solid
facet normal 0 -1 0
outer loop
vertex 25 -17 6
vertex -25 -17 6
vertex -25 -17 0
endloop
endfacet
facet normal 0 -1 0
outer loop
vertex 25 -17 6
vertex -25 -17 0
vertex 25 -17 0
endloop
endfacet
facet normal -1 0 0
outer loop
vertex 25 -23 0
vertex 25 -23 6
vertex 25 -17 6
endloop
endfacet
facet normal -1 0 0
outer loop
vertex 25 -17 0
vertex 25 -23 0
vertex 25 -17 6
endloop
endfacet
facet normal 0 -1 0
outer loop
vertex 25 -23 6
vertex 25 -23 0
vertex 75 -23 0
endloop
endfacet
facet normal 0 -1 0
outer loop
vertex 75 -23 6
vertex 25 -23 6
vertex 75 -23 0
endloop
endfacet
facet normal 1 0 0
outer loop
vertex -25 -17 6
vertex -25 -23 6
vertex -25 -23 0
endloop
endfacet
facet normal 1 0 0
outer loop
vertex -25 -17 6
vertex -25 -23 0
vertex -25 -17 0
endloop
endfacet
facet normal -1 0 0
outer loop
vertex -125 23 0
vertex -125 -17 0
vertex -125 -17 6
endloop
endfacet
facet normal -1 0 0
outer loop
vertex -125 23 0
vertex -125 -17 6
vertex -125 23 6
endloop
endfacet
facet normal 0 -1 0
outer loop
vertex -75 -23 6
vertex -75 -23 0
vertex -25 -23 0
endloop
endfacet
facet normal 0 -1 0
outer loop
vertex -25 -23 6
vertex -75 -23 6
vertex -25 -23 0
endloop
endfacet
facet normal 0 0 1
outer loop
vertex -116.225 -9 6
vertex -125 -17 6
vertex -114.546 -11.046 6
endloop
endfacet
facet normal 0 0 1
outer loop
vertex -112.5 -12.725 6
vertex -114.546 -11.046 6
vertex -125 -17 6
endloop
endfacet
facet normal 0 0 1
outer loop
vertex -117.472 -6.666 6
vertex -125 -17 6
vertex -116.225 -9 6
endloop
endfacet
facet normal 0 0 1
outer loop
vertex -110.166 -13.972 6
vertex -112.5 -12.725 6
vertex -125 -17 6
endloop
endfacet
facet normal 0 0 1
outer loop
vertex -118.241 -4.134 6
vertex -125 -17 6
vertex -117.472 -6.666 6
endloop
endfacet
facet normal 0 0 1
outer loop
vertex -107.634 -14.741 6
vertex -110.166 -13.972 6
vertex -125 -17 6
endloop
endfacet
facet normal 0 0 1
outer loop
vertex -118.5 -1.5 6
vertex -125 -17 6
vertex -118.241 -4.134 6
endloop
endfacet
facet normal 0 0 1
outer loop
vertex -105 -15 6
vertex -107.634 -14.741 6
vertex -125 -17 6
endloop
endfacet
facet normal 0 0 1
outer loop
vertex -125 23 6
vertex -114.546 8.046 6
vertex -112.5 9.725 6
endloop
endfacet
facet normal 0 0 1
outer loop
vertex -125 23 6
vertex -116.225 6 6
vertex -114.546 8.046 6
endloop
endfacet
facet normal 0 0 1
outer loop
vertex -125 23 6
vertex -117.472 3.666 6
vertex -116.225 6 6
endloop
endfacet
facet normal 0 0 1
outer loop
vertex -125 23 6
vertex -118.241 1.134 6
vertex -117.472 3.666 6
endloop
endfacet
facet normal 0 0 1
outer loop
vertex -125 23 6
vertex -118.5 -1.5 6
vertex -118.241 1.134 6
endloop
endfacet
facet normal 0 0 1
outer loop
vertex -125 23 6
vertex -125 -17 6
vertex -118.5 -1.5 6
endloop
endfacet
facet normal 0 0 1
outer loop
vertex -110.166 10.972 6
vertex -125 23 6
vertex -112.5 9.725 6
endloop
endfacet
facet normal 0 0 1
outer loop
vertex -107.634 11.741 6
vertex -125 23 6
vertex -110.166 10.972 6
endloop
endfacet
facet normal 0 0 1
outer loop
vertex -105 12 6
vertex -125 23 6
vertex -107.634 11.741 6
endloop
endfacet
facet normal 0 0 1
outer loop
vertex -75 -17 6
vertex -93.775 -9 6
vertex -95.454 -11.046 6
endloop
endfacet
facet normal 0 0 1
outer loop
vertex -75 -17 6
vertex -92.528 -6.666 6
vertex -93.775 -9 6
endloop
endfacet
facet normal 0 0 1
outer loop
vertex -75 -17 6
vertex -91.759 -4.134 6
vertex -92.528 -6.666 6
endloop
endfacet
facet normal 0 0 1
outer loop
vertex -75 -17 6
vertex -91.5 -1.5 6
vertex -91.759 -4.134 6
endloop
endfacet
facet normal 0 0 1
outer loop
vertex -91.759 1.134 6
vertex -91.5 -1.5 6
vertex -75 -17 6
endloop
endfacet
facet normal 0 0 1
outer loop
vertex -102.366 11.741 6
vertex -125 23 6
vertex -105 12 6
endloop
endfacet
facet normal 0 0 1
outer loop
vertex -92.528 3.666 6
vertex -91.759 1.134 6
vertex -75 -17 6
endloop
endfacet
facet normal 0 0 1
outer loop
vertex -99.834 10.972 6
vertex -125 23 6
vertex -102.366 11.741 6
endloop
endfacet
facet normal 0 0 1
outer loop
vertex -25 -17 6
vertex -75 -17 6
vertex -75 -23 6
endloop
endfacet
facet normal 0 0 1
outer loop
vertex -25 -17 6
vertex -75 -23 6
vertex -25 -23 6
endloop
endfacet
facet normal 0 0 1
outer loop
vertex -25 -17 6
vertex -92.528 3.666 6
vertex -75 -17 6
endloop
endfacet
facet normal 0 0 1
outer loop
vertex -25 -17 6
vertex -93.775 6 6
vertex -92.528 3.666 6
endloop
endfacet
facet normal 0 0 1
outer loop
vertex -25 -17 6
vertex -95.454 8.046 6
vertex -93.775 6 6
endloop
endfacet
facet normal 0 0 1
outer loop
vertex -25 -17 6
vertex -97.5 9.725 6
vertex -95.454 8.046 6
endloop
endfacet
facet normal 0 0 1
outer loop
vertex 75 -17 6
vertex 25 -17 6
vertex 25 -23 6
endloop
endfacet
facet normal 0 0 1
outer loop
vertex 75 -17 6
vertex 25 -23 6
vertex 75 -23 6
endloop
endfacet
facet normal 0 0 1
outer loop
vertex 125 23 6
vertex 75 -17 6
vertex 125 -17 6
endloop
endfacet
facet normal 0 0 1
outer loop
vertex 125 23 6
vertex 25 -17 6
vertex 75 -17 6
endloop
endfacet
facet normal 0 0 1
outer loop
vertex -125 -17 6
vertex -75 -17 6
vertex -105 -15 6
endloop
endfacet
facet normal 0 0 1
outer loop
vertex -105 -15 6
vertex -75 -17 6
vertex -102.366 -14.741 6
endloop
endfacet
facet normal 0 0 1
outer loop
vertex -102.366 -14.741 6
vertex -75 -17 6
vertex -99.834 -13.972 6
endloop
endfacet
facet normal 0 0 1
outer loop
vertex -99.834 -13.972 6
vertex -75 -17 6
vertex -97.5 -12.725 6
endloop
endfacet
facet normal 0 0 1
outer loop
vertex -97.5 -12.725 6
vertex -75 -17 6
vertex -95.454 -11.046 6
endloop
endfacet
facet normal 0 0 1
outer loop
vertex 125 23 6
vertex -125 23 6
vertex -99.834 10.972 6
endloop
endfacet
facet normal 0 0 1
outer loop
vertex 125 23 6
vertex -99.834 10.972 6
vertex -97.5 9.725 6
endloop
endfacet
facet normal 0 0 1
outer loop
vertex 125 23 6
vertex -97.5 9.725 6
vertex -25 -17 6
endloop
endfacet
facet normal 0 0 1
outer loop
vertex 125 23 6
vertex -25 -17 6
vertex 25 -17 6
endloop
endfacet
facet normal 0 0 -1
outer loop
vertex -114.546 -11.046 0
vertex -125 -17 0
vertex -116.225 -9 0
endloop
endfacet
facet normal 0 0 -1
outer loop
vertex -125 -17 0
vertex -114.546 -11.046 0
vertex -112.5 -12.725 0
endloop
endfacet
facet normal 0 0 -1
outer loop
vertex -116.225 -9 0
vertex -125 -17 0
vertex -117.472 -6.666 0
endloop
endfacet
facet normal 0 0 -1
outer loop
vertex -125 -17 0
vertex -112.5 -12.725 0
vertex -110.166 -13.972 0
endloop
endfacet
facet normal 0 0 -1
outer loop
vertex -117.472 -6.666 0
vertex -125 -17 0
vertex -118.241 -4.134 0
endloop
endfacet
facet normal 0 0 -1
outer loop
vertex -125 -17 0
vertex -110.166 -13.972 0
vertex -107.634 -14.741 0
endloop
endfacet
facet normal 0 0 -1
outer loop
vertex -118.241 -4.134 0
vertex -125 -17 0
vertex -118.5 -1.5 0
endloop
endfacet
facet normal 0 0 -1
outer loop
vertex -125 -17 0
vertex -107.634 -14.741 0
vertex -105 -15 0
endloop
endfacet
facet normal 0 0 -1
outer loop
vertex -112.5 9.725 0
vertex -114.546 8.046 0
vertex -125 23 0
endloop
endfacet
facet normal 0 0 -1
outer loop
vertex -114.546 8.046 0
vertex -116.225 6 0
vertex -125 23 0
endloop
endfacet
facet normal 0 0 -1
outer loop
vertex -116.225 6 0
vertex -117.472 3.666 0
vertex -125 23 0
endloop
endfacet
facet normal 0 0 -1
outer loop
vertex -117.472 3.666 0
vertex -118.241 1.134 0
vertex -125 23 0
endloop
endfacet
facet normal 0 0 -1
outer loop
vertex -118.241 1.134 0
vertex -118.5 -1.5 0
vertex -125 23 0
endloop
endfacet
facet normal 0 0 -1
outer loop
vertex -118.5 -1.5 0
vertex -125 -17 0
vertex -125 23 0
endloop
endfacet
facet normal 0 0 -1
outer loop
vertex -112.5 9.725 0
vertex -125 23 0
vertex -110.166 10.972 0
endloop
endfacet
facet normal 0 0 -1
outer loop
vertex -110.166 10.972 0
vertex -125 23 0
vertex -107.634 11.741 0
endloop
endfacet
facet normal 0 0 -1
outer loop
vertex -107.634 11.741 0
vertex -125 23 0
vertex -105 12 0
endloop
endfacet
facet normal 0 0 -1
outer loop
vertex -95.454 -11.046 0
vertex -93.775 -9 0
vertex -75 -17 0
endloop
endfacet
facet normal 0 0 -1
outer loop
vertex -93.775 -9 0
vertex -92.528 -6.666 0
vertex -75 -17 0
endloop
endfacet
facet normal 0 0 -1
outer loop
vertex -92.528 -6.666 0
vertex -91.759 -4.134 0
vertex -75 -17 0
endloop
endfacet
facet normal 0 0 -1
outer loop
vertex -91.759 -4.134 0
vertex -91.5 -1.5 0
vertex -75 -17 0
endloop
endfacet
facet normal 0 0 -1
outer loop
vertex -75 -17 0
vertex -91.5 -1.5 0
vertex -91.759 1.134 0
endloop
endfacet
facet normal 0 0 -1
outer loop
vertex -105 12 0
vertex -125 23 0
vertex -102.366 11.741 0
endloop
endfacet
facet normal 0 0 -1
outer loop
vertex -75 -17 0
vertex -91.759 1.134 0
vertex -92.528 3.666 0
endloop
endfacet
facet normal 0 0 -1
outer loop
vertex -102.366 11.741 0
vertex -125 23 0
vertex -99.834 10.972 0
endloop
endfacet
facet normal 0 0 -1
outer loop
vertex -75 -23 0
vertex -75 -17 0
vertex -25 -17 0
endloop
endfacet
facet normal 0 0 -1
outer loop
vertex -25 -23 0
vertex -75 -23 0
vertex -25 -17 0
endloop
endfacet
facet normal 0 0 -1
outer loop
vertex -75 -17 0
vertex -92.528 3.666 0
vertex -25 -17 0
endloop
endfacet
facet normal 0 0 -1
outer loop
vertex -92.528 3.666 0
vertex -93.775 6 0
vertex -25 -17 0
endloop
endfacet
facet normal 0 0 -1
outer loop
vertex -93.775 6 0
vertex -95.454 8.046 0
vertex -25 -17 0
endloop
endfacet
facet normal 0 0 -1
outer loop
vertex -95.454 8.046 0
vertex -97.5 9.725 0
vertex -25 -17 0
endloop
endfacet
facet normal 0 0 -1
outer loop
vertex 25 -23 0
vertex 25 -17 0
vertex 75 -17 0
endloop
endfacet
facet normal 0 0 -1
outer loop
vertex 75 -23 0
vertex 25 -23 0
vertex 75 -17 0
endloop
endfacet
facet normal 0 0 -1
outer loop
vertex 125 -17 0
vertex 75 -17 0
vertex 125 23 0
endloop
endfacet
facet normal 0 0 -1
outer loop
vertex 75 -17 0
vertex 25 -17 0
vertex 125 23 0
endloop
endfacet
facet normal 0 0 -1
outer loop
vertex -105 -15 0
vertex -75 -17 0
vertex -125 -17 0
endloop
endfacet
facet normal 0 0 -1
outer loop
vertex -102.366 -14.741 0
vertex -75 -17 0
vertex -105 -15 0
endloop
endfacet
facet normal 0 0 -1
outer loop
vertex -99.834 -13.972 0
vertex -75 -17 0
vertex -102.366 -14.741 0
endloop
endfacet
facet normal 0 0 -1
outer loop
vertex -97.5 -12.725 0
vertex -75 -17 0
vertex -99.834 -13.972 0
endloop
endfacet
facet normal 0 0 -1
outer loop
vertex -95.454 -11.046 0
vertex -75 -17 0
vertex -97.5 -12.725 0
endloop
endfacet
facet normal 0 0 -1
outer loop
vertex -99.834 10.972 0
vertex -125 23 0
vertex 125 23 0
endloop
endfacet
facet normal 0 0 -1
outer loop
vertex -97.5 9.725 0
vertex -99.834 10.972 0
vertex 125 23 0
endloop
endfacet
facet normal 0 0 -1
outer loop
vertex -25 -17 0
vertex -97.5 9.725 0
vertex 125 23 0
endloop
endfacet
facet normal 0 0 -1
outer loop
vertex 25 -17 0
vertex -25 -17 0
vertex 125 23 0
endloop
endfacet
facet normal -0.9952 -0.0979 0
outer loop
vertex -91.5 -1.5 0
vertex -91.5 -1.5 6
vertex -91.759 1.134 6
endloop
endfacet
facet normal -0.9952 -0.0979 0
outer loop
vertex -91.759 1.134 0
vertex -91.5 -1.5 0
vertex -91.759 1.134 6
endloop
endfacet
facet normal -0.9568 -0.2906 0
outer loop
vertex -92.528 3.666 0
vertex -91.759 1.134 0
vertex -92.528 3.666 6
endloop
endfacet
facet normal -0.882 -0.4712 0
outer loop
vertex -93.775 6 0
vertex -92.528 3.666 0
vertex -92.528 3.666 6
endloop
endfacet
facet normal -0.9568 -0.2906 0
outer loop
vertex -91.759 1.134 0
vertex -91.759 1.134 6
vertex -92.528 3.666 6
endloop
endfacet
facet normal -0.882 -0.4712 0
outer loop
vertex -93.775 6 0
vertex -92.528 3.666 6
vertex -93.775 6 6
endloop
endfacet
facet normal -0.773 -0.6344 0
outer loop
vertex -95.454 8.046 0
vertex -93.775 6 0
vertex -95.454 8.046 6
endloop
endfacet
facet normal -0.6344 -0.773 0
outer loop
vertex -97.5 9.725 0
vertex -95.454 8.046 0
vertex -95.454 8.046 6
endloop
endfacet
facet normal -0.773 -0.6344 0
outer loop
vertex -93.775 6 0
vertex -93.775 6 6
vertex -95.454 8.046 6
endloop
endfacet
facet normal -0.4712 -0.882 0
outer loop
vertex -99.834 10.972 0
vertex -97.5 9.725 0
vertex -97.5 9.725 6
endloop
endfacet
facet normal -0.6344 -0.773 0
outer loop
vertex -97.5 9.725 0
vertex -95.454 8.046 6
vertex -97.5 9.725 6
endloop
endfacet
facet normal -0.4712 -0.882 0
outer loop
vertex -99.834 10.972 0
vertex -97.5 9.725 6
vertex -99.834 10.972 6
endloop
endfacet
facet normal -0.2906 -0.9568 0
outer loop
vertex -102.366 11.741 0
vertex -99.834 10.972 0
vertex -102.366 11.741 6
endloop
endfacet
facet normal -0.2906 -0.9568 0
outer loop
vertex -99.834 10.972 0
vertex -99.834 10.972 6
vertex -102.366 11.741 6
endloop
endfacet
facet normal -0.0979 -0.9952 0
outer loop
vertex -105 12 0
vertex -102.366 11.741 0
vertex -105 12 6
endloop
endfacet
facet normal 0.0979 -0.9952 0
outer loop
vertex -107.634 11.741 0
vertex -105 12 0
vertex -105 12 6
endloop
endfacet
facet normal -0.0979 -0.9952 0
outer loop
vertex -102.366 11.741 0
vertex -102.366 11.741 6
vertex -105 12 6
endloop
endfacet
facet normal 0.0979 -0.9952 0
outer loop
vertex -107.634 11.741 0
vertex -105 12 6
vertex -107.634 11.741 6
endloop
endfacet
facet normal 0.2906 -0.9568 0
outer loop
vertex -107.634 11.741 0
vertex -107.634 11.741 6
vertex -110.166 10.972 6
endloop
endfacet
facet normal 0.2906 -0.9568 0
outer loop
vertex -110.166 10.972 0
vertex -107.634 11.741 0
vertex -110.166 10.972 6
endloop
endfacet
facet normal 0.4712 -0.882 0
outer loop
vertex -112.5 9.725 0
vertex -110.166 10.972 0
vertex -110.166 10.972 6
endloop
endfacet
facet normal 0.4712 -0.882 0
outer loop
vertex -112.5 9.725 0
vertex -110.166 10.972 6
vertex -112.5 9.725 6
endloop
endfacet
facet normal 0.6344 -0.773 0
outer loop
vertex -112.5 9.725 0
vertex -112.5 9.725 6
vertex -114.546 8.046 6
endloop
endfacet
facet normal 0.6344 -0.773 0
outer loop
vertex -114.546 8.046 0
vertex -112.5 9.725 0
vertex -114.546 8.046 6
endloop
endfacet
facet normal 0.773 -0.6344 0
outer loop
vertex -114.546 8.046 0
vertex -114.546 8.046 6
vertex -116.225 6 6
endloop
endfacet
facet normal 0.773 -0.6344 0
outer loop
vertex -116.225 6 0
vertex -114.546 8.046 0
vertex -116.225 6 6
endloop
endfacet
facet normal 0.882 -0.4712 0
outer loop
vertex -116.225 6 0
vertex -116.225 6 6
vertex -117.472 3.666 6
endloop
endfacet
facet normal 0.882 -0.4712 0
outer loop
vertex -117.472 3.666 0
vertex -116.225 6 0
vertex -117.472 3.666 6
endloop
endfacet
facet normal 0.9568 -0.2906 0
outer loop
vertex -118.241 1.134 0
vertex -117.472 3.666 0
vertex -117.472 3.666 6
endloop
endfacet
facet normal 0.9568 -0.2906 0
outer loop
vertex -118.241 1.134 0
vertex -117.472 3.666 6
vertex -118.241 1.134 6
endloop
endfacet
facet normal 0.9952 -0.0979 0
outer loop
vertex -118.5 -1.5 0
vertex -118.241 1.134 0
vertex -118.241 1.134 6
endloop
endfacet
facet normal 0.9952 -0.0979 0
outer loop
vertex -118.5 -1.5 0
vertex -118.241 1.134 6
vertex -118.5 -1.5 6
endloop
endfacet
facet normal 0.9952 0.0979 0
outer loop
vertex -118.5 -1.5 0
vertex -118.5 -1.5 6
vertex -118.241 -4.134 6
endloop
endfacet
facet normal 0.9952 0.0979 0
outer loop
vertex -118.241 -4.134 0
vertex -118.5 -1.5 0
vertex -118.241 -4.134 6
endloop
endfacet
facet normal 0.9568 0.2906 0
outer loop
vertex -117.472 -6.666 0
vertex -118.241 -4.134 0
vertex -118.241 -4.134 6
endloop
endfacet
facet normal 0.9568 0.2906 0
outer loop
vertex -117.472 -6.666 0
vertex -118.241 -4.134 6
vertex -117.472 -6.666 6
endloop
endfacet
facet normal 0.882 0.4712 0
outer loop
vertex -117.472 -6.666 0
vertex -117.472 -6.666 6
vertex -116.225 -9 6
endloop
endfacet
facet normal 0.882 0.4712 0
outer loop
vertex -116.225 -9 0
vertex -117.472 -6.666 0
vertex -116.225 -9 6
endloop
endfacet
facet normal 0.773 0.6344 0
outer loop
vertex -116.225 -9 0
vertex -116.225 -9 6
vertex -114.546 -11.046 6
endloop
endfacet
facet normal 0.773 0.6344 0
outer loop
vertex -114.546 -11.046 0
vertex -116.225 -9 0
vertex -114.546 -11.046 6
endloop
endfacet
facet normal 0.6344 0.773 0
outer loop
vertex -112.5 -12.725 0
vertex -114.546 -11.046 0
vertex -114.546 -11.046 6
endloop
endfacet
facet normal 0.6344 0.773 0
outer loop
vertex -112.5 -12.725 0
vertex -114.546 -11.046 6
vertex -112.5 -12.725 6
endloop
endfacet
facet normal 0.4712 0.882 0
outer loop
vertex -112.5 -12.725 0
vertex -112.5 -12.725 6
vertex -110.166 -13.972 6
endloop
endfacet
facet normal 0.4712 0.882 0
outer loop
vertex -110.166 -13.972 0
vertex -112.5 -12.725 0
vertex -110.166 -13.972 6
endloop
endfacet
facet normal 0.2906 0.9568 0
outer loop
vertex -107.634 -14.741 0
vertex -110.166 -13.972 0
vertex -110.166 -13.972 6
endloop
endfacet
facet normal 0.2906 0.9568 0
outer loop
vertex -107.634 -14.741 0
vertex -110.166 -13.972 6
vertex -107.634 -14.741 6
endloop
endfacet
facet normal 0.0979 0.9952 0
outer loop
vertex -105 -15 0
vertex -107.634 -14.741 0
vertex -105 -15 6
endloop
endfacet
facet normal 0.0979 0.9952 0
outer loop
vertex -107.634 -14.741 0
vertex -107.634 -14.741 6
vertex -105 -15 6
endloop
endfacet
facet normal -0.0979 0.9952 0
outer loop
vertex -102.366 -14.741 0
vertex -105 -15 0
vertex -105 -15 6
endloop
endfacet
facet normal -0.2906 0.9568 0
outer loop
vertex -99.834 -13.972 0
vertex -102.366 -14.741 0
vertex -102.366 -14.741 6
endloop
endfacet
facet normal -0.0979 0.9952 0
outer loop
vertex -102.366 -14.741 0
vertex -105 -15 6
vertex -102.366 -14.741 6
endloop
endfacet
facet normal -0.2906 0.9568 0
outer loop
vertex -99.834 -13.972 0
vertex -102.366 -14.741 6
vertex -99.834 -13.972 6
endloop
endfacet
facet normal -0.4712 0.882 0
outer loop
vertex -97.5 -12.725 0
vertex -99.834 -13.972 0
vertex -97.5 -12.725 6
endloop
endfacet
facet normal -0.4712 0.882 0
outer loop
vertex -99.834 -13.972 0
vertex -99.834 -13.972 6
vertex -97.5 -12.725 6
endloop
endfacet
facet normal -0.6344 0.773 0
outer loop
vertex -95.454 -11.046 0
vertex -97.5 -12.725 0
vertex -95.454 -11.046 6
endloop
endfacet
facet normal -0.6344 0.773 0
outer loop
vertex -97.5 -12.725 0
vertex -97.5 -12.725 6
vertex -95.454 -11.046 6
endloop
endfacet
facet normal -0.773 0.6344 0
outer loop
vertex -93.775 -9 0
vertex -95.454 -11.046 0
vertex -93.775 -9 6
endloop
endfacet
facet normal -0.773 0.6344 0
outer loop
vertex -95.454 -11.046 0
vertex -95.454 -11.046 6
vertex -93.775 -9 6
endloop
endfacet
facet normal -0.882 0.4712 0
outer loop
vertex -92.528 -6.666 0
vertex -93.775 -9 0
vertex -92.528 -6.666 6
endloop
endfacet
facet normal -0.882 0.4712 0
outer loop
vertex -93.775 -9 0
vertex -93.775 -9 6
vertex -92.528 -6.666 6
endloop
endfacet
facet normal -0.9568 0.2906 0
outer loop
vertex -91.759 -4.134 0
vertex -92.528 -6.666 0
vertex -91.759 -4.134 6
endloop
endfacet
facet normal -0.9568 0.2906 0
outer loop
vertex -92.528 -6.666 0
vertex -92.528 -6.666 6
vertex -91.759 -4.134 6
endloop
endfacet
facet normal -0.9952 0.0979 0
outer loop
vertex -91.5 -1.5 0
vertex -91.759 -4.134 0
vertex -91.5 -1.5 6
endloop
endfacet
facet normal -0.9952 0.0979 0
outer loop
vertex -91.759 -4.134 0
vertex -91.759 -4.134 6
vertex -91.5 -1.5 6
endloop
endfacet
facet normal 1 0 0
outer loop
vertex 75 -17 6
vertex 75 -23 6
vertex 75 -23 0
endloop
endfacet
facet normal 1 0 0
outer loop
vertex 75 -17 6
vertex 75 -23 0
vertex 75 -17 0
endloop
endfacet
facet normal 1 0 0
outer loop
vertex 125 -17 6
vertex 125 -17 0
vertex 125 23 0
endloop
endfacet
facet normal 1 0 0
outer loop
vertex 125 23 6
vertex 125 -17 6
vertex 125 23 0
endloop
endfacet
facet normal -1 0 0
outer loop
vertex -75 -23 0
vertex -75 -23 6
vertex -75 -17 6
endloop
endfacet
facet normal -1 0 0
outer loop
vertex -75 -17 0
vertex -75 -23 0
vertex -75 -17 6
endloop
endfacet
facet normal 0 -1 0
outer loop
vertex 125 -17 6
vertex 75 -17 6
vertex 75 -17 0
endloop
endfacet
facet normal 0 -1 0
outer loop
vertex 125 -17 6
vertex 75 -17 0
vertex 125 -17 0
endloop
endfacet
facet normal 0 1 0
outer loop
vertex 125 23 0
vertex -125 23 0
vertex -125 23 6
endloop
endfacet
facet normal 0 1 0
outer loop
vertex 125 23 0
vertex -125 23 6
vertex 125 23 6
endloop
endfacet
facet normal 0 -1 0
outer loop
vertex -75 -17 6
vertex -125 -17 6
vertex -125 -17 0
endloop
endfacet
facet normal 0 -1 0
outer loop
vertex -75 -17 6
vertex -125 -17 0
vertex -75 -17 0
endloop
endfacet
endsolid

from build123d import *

# Parameters (mm, degrees)
SKETCH1_W           = 250
SKETCH1_H           = 46
BOSS_EXTRUDE1_DEPTH = 6
SKETCH2_W           = 50
SKETCH2_H           = 6
CUT_EXTRUDE1_DEPTH  = 6
SKETCH3_R           = 13.5
CUT_EXTRUDE2_DEPTH  = 10


with BuildPart() as part:
    # Sketch1 → Boss-Extrude1 (new body)
    with BuildSketch(Plane.XY):
        Rectangle(SKETCH1_W, SKETCH1_H)
    extrude(amount=BOSS_EXTRUDE1_DEPTH)

    # Sketch2 → Cut-Extrude1 (cut)
    with BuildSketch(Plane.XY.offset(6)):
        with Locations((0, -20)):
            Rectangle(SKETCH2_W, SKETCH2_H)
        with Locations((-100, -20)):
            Rectangle(SKETCH2_W, SKETCH2_H)
        with Locations((100, -20)):
            Rectangle(SKETCH2_W, SKETCH2_H)
    extrude(amount=-CUT_EXTRUDE1_DEPTH, mode=Mode.SUBTRACT)

    # Sketch3 → Cut-Extrude2 (cut)
    with BuildSketch(Plane.XY.offset(6)):
        with Locations((-105, -1.5)):
            Circle(SKETCH3_R)
    extrude(amount=-CUT_EXTRUDE2_DEPTH, mode=Mode.SUBTRACT)


solid = part.part
